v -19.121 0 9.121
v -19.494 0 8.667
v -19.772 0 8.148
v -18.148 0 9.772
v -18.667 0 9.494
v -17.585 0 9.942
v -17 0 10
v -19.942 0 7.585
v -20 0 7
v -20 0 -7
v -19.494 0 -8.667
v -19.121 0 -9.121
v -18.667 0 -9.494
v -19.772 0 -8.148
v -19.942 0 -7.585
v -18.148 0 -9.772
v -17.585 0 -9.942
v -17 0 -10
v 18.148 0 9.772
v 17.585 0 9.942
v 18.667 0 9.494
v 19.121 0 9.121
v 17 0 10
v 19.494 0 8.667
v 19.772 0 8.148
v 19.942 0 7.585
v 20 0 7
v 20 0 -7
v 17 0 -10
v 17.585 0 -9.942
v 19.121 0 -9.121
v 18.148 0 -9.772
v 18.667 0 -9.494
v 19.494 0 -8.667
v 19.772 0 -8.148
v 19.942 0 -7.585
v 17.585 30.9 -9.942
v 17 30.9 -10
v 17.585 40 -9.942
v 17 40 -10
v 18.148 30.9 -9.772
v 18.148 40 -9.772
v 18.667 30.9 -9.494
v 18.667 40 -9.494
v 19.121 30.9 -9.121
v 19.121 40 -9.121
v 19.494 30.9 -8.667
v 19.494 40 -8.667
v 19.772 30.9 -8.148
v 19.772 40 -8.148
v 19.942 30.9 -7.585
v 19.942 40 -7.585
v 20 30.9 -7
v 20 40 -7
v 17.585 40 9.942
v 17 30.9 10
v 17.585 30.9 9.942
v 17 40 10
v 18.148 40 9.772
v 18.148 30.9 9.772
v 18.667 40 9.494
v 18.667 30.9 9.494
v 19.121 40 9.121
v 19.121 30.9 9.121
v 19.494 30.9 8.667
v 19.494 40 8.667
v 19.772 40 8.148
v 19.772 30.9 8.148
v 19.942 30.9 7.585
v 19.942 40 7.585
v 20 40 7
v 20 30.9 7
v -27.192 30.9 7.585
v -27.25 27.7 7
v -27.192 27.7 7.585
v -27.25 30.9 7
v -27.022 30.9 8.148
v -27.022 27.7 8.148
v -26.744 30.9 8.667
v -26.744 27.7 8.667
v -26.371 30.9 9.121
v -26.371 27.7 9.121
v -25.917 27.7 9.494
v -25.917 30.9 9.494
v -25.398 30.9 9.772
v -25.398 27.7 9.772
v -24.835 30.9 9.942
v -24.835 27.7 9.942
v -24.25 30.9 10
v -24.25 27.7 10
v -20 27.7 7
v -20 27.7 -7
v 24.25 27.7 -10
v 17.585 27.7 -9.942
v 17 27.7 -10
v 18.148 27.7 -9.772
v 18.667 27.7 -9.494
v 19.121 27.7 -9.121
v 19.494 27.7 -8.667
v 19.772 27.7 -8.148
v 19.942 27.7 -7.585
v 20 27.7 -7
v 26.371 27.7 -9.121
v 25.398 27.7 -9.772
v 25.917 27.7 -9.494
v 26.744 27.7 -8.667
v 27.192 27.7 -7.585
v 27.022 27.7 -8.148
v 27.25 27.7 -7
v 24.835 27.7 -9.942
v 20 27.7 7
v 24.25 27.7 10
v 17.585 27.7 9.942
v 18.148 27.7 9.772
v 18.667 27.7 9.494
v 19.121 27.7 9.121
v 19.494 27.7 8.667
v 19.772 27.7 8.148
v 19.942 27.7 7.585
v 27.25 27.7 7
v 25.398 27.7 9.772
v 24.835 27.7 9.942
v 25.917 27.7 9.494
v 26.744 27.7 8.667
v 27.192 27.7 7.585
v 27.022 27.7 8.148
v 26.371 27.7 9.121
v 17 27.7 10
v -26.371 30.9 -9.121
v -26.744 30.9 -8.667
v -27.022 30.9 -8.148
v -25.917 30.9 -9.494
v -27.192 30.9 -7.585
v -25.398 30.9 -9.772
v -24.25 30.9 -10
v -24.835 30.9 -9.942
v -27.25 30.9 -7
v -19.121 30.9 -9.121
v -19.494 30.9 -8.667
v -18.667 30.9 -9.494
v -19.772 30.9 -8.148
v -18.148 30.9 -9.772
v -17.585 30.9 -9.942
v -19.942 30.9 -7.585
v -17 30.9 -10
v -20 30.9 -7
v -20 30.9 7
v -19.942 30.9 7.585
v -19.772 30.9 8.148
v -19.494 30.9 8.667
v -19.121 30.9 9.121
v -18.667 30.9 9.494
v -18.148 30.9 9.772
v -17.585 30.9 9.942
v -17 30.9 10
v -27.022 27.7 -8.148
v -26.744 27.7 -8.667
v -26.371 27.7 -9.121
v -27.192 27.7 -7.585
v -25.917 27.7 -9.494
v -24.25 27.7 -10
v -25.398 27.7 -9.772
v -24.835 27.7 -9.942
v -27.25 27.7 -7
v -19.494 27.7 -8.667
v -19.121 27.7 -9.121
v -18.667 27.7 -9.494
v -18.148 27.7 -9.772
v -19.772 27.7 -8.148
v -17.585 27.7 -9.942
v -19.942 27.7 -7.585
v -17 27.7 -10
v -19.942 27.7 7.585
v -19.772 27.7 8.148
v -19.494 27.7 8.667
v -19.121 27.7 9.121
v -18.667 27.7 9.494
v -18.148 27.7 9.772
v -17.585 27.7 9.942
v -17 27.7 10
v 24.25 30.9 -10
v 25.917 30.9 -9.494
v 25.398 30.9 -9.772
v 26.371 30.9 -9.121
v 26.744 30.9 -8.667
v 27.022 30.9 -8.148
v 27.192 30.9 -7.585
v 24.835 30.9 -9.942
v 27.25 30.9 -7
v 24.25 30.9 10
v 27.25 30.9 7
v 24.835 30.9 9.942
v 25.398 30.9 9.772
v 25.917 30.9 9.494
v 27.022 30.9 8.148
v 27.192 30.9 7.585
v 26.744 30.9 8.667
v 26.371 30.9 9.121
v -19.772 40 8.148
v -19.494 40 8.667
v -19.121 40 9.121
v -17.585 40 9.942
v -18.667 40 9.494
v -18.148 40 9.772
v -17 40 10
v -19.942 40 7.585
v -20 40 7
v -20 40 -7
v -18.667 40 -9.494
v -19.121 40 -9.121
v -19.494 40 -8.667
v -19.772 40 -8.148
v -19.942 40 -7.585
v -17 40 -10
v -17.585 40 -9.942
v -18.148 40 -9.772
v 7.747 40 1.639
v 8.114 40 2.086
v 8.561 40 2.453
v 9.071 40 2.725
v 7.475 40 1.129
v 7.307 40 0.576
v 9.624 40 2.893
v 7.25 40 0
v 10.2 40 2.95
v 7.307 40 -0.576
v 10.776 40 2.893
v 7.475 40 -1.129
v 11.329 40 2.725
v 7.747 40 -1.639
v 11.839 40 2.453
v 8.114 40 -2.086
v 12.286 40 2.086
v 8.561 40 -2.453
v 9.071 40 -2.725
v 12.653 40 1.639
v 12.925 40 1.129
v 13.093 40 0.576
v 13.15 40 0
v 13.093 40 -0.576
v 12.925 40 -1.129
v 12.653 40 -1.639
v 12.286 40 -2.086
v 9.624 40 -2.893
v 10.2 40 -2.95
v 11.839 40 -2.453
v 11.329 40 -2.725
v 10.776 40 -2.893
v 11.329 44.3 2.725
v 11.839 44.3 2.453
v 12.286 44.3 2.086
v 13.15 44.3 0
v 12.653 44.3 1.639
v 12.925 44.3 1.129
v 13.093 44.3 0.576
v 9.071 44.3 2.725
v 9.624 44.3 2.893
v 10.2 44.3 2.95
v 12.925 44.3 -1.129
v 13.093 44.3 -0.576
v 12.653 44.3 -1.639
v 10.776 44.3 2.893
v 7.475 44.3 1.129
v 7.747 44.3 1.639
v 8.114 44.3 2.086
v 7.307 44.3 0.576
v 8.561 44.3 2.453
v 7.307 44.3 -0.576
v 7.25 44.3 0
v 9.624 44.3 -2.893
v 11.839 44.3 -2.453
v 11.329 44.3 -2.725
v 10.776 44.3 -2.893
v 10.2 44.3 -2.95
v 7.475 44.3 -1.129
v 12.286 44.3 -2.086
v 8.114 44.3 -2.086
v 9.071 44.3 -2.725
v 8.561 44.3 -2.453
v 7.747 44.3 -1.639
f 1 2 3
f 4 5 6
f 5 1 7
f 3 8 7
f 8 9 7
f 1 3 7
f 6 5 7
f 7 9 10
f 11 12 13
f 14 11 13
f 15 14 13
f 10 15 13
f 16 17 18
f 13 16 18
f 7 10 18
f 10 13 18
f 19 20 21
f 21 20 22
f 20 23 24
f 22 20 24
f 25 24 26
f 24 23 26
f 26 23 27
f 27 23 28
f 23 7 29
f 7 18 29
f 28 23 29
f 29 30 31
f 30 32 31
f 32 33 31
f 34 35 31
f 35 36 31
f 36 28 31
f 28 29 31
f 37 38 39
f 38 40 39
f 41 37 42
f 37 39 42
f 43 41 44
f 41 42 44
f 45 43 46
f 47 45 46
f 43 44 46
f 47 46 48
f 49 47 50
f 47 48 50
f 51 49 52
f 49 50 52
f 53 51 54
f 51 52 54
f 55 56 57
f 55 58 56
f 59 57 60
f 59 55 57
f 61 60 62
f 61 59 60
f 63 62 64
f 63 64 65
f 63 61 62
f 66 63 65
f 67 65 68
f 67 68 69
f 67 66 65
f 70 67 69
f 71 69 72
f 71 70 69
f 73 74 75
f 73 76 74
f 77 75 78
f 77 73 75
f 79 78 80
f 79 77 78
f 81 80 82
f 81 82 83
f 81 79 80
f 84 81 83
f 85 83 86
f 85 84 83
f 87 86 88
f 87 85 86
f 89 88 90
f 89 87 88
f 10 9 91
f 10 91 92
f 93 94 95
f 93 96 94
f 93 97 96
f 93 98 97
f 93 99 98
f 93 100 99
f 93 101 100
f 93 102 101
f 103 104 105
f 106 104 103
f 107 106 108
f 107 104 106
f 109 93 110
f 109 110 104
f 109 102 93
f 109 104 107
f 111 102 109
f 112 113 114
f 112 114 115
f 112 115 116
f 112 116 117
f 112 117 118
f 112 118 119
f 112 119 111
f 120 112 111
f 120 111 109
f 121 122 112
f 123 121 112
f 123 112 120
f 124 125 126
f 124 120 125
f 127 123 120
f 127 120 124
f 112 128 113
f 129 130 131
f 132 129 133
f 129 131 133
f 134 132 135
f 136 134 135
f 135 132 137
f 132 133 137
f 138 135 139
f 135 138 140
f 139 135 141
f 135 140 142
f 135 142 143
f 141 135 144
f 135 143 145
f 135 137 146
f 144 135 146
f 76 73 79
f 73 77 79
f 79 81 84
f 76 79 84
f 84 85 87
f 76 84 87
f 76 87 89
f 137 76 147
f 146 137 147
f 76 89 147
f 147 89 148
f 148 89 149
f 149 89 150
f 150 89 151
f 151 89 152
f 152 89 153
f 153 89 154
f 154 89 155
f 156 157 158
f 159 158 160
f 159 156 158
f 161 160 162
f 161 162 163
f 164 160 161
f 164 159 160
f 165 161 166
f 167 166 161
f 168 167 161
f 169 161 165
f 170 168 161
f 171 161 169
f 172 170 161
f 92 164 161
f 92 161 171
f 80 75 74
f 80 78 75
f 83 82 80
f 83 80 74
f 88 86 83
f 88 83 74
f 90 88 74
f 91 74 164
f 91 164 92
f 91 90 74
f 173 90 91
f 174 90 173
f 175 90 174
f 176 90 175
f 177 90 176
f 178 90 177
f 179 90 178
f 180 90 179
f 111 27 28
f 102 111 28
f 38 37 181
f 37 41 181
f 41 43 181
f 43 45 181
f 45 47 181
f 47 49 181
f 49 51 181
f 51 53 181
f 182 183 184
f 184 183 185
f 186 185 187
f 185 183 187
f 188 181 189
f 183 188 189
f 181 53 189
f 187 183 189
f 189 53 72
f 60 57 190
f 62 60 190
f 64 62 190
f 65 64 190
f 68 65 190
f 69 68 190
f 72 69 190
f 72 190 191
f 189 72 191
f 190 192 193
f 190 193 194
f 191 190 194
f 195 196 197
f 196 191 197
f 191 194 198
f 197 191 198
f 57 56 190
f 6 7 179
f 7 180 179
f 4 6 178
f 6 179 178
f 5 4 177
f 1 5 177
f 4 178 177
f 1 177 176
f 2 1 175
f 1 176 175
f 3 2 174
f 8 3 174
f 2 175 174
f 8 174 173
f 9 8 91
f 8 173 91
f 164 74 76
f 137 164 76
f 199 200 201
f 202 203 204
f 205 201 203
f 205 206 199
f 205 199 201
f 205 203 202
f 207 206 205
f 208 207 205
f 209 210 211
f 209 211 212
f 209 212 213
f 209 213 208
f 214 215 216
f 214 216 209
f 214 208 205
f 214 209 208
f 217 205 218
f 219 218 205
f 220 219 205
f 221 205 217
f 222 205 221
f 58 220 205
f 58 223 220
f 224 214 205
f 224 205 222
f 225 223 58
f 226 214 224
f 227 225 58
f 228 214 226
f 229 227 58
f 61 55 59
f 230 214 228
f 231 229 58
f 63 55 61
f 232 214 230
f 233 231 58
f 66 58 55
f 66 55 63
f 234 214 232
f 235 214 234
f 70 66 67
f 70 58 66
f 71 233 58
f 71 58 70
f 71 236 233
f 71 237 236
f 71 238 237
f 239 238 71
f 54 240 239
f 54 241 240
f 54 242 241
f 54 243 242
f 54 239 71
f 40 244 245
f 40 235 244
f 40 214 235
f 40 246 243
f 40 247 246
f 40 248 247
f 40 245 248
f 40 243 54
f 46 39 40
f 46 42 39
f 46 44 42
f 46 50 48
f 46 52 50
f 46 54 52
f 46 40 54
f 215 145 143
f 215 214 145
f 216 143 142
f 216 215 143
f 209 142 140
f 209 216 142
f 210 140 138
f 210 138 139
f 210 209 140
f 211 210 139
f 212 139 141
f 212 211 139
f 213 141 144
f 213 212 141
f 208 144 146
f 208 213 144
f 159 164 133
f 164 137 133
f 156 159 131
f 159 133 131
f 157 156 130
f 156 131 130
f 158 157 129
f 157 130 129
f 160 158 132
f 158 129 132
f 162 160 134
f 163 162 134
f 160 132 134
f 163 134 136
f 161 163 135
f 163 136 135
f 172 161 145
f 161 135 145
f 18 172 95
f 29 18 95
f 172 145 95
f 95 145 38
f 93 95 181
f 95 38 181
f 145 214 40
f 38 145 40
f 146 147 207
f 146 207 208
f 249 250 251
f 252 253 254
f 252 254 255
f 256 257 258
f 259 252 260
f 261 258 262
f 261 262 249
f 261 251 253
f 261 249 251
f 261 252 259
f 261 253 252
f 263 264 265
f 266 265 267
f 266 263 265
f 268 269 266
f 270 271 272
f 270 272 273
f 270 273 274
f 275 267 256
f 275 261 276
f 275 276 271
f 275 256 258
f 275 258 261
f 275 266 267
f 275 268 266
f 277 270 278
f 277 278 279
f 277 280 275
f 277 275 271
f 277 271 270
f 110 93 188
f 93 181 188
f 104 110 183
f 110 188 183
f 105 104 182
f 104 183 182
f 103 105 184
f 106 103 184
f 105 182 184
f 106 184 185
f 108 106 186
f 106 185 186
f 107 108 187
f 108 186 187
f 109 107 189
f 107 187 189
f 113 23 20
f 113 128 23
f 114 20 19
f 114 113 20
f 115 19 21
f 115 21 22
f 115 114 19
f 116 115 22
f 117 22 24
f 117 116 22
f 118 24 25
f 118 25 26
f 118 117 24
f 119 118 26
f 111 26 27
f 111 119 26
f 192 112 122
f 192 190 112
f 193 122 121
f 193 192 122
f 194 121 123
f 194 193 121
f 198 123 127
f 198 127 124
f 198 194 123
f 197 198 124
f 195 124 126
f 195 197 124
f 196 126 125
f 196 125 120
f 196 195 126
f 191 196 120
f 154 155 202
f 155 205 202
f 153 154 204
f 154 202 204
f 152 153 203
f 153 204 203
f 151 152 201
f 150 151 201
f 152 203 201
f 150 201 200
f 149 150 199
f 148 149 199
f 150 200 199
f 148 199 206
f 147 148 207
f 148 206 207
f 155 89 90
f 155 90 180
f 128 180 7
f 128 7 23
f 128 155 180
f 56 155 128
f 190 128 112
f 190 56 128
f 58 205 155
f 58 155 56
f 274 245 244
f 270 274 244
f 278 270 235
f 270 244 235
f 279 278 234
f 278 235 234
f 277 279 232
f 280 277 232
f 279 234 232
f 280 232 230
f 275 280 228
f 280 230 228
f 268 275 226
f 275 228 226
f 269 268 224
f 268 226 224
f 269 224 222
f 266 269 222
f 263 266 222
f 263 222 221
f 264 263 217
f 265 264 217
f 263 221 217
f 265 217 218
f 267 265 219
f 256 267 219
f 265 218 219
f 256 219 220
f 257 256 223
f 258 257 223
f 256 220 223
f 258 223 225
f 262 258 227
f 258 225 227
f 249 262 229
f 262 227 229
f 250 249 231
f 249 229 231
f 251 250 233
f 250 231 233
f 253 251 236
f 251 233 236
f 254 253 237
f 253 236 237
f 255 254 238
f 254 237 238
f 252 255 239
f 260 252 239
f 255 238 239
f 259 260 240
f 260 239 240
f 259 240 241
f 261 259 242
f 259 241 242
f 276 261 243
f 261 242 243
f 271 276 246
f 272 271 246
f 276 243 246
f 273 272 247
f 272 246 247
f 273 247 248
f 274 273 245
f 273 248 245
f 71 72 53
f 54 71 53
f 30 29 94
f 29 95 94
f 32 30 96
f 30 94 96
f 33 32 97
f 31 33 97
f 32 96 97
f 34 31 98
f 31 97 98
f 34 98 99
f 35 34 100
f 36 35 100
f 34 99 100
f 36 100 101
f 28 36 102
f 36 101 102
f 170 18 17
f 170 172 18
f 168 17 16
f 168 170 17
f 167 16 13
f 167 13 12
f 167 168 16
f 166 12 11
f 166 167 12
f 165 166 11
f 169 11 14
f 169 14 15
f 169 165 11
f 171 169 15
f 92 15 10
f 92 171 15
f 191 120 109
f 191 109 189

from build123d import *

# Parameters (mm, degrees)
SKETCH1_W           = 40
SKETCH1_H           = 20
BOSS_EXTRUDE1_DEPTH = 40
SKETCH2_W           = 54.5
SKETCH2_H           = 3.2
BOSS_EXTRUDE2_DEPTH = 20
FILLET1_R           = 3
SKETCH3_R           = 2.95
BOSS_EXTRUDE3_DEPTH = 4.3


with BuildPart() as part:
    # Sketch1 → Boss-Extrude1 (new body)
    with BuildSketch(Plane(origin=(0, 0, 0), x_dir=(1, 0, 0), z_dir=(0, 1, 0))):
        Rectangle(SKETCH1_W, SKETCH1_H)
    extrude(amount=BOSS_EXTRUDE1_DEPTH)

    # Sketch2 → Boss-Extrude2 (add)
    with BuildSketch(Plane.XY.offset(10)):
        with Locations((0, 29.3)):
            Rectangle(SKETCH2_W, SKETCH2_H)
    extrude(amount=-BOSS_EXTRUDE2_DEPTH)

    # Fillet1
    fillet1_edges = [part.edges().sort_by_distance(p)[0] for p in [
        (20, 13.85, 10),
        (-20, 13.85, 10),
        (-20, 13.85, -10),
        (20, 13.85, -10),
        (27.25, 29.3, 10),
        (27.25, 29.3, -10),
        (-27.25, 29.3, -10),
        (-27.25, 29.3, 10),
        (20, 35.45, 10),
        (-20, 35.45, 10),
        (-20, 35.45, -10),
        (20, 35.45, -10),
    ]]
    fillet(fillet1_edges, radius=FILLET1_R)

    # Sketch3 → Boss-Extrude3 (add)
    with BuildSketch(Plane(origin=(0, 40, 0), x_dir=(1, 0, 0), z_dir=(0, 1, 0))):
        with Locations(Location((10.2, 0, 0), (0, 0, 90))):
            Circle(SKETCH3_R)
    extrude(amount=BOSS_EXTRUDE3_DEPTH)


solid = part.part
